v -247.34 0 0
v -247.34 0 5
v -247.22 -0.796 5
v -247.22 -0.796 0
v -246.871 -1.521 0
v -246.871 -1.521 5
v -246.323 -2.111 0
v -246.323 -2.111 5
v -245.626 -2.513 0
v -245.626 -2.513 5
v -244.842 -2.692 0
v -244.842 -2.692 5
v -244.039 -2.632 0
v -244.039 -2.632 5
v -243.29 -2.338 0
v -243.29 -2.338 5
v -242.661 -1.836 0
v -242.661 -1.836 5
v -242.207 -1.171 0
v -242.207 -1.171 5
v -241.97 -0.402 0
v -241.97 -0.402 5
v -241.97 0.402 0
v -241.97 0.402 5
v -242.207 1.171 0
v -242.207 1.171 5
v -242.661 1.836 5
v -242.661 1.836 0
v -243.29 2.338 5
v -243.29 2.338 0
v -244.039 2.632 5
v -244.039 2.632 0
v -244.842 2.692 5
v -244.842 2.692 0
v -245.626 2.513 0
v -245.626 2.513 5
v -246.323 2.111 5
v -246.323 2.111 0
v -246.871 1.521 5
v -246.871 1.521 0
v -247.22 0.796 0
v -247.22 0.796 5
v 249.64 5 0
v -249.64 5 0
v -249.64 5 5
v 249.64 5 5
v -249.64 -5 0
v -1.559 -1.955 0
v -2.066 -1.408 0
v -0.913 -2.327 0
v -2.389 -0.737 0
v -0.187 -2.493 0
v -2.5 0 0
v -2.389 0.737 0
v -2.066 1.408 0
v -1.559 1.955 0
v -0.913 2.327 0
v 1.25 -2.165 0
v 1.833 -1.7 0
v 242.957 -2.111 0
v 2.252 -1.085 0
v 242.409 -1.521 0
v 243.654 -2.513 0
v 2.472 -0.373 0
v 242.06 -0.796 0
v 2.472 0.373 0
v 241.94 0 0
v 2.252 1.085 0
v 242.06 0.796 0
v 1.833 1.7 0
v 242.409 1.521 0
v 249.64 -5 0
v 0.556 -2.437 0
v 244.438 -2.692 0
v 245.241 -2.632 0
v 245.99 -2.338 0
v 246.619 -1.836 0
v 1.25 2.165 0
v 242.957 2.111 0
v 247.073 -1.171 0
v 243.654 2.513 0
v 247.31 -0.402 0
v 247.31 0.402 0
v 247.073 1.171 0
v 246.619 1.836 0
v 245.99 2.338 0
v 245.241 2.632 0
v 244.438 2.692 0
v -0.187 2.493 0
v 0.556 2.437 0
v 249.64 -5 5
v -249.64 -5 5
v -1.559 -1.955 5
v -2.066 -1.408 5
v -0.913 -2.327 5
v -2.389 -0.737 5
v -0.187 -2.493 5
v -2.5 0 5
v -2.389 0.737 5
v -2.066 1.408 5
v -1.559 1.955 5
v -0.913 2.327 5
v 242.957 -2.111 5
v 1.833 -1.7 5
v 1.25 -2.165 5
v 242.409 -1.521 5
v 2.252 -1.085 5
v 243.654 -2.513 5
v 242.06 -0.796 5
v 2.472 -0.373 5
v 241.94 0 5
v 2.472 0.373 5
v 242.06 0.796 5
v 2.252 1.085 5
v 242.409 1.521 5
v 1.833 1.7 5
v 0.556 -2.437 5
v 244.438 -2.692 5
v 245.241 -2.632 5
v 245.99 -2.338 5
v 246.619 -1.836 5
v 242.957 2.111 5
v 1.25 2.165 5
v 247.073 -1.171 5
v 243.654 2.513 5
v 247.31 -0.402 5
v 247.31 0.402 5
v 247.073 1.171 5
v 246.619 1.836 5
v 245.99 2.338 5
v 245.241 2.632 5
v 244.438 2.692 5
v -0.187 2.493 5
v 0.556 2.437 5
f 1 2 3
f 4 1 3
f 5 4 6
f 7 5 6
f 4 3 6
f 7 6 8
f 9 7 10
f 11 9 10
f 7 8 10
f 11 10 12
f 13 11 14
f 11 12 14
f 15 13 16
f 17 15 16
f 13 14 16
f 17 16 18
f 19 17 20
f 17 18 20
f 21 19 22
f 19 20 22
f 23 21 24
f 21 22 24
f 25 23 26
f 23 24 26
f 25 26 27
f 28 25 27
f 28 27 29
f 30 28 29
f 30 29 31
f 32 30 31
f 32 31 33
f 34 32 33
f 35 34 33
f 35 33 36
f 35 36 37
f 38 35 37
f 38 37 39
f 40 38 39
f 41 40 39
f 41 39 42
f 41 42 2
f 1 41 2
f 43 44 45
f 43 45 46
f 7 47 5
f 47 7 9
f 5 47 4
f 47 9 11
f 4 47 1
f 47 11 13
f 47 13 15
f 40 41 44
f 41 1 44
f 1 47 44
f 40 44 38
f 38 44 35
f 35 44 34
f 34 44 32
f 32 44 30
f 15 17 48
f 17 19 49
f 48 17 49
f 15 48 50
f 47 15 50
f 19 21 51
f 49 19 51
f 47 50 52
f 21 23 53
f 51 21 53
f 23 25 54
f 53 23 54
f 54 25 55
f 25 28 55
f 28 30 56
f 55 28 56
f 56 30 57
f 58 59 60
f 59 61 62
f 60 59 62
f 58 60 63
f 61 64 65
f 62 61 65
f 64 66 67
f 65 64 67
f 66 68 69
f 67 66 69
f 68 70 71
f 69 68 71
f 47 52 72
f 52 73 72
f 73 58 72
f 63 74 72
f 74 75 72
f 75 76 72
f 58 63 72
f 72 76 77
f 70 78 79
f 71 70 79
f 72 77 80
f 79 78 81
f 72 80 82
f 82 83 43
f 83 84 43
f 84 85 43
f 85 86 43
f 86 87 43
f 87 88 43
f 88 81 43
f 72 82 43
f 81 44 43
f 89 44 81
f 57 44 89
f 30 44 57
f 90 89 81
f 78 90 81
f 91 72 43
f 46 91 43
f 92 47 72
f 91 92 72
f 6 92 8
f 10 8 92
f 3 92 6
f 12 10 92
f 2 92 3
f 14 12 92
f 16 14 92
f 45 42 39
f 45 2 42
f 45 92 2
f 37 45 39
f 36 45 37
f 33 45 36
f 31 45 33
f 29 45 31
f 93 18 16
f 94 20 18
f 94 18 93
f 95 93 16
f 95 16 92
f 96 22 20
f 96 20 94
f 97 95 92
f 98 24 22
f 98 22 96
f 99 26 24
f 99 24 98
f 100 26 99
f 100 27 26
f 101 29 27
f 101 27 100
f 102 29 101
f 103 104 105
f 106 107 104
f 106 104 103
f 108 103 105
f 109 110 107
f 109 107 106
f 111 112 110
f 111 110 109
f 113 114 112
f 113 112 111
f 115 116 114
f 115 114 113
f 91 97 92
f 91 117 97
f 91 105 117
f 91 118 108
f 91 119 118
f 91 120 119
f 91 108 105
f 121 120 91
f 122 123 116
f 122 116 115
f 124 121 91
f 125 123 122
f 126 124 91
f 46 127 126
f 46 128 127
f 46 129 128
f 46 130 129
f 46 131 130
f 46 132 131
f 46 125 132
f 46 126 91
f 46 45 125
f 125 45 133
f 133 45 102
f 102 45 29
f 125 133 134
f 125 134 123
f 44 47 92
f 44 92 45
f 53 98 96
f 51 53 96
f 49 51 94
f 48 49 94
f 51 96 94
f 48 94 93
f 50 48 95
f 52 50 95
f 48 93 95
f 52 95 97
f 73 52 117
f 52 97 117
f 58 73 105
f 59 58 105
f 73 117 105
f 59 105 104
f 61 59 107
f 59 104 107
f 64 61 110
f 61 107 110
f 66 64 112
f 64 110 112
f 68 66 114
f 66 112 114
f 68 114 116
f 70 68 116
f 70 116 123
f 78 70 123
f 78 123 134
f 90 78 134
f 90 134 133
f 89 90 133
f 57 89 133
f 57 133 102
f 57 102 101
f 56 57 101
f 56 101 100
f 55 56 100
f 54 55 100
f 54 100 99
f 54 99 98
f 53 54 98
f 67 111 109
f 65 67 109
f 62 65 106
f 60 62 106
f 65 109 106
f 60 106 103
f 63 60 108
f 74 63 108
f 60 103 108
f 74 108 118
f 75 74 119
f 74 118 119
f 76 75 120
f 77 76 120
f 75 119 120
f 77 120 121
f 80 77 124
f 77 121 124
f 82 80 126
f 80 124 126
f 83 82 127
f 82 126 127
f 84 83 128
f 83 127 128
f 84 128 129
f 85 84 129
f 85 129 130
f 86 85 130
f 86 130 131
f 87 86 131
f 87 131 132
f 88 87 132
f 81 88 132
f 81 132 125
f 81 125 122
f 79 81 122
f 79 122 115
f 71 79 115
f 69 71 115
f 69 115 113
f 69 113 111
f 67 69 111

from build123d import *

# Parameters (mm, degrees)
F0_W     = 499.28
F0_H     = 10
F1_DEPTH = 5
F2_D     = 5.4
F3_D     = 5
F4_D     = 5.4


with BuildPart() as f1:
    # F0 (on Top) → F1 (new body)
    with BuildSketch(Plane.XY):
        Rectangle(F0_W, F0_H)
    extrude(amount=F1_DEPTH)

    # F2 (through all)
    with Locations(Plane(origin=(0, 0, 0), x_dir=(1, 0, 0), z_dir=(0, 0, -1))):
        with Locations((-244.64, 0)):
            Hole(F2_D / 2)

    # F3 (through all)
    with Locations(Plane(origin=(0, 0, 0), x_dir=(1, 0, 0), z_dir=(0, 0, -1))):
        with Locations((0, 0)):
            Hole(F3_D / 2)

    # F4 (through all)
    with Locations(Plane(origin=(0, 0, 0), x_dir=(1, 0, 0), z_dir=(0, 0, -1))):
        with Locations((244.64, 0)):
            Hole(F4_D / 2)


solid = f1.part
